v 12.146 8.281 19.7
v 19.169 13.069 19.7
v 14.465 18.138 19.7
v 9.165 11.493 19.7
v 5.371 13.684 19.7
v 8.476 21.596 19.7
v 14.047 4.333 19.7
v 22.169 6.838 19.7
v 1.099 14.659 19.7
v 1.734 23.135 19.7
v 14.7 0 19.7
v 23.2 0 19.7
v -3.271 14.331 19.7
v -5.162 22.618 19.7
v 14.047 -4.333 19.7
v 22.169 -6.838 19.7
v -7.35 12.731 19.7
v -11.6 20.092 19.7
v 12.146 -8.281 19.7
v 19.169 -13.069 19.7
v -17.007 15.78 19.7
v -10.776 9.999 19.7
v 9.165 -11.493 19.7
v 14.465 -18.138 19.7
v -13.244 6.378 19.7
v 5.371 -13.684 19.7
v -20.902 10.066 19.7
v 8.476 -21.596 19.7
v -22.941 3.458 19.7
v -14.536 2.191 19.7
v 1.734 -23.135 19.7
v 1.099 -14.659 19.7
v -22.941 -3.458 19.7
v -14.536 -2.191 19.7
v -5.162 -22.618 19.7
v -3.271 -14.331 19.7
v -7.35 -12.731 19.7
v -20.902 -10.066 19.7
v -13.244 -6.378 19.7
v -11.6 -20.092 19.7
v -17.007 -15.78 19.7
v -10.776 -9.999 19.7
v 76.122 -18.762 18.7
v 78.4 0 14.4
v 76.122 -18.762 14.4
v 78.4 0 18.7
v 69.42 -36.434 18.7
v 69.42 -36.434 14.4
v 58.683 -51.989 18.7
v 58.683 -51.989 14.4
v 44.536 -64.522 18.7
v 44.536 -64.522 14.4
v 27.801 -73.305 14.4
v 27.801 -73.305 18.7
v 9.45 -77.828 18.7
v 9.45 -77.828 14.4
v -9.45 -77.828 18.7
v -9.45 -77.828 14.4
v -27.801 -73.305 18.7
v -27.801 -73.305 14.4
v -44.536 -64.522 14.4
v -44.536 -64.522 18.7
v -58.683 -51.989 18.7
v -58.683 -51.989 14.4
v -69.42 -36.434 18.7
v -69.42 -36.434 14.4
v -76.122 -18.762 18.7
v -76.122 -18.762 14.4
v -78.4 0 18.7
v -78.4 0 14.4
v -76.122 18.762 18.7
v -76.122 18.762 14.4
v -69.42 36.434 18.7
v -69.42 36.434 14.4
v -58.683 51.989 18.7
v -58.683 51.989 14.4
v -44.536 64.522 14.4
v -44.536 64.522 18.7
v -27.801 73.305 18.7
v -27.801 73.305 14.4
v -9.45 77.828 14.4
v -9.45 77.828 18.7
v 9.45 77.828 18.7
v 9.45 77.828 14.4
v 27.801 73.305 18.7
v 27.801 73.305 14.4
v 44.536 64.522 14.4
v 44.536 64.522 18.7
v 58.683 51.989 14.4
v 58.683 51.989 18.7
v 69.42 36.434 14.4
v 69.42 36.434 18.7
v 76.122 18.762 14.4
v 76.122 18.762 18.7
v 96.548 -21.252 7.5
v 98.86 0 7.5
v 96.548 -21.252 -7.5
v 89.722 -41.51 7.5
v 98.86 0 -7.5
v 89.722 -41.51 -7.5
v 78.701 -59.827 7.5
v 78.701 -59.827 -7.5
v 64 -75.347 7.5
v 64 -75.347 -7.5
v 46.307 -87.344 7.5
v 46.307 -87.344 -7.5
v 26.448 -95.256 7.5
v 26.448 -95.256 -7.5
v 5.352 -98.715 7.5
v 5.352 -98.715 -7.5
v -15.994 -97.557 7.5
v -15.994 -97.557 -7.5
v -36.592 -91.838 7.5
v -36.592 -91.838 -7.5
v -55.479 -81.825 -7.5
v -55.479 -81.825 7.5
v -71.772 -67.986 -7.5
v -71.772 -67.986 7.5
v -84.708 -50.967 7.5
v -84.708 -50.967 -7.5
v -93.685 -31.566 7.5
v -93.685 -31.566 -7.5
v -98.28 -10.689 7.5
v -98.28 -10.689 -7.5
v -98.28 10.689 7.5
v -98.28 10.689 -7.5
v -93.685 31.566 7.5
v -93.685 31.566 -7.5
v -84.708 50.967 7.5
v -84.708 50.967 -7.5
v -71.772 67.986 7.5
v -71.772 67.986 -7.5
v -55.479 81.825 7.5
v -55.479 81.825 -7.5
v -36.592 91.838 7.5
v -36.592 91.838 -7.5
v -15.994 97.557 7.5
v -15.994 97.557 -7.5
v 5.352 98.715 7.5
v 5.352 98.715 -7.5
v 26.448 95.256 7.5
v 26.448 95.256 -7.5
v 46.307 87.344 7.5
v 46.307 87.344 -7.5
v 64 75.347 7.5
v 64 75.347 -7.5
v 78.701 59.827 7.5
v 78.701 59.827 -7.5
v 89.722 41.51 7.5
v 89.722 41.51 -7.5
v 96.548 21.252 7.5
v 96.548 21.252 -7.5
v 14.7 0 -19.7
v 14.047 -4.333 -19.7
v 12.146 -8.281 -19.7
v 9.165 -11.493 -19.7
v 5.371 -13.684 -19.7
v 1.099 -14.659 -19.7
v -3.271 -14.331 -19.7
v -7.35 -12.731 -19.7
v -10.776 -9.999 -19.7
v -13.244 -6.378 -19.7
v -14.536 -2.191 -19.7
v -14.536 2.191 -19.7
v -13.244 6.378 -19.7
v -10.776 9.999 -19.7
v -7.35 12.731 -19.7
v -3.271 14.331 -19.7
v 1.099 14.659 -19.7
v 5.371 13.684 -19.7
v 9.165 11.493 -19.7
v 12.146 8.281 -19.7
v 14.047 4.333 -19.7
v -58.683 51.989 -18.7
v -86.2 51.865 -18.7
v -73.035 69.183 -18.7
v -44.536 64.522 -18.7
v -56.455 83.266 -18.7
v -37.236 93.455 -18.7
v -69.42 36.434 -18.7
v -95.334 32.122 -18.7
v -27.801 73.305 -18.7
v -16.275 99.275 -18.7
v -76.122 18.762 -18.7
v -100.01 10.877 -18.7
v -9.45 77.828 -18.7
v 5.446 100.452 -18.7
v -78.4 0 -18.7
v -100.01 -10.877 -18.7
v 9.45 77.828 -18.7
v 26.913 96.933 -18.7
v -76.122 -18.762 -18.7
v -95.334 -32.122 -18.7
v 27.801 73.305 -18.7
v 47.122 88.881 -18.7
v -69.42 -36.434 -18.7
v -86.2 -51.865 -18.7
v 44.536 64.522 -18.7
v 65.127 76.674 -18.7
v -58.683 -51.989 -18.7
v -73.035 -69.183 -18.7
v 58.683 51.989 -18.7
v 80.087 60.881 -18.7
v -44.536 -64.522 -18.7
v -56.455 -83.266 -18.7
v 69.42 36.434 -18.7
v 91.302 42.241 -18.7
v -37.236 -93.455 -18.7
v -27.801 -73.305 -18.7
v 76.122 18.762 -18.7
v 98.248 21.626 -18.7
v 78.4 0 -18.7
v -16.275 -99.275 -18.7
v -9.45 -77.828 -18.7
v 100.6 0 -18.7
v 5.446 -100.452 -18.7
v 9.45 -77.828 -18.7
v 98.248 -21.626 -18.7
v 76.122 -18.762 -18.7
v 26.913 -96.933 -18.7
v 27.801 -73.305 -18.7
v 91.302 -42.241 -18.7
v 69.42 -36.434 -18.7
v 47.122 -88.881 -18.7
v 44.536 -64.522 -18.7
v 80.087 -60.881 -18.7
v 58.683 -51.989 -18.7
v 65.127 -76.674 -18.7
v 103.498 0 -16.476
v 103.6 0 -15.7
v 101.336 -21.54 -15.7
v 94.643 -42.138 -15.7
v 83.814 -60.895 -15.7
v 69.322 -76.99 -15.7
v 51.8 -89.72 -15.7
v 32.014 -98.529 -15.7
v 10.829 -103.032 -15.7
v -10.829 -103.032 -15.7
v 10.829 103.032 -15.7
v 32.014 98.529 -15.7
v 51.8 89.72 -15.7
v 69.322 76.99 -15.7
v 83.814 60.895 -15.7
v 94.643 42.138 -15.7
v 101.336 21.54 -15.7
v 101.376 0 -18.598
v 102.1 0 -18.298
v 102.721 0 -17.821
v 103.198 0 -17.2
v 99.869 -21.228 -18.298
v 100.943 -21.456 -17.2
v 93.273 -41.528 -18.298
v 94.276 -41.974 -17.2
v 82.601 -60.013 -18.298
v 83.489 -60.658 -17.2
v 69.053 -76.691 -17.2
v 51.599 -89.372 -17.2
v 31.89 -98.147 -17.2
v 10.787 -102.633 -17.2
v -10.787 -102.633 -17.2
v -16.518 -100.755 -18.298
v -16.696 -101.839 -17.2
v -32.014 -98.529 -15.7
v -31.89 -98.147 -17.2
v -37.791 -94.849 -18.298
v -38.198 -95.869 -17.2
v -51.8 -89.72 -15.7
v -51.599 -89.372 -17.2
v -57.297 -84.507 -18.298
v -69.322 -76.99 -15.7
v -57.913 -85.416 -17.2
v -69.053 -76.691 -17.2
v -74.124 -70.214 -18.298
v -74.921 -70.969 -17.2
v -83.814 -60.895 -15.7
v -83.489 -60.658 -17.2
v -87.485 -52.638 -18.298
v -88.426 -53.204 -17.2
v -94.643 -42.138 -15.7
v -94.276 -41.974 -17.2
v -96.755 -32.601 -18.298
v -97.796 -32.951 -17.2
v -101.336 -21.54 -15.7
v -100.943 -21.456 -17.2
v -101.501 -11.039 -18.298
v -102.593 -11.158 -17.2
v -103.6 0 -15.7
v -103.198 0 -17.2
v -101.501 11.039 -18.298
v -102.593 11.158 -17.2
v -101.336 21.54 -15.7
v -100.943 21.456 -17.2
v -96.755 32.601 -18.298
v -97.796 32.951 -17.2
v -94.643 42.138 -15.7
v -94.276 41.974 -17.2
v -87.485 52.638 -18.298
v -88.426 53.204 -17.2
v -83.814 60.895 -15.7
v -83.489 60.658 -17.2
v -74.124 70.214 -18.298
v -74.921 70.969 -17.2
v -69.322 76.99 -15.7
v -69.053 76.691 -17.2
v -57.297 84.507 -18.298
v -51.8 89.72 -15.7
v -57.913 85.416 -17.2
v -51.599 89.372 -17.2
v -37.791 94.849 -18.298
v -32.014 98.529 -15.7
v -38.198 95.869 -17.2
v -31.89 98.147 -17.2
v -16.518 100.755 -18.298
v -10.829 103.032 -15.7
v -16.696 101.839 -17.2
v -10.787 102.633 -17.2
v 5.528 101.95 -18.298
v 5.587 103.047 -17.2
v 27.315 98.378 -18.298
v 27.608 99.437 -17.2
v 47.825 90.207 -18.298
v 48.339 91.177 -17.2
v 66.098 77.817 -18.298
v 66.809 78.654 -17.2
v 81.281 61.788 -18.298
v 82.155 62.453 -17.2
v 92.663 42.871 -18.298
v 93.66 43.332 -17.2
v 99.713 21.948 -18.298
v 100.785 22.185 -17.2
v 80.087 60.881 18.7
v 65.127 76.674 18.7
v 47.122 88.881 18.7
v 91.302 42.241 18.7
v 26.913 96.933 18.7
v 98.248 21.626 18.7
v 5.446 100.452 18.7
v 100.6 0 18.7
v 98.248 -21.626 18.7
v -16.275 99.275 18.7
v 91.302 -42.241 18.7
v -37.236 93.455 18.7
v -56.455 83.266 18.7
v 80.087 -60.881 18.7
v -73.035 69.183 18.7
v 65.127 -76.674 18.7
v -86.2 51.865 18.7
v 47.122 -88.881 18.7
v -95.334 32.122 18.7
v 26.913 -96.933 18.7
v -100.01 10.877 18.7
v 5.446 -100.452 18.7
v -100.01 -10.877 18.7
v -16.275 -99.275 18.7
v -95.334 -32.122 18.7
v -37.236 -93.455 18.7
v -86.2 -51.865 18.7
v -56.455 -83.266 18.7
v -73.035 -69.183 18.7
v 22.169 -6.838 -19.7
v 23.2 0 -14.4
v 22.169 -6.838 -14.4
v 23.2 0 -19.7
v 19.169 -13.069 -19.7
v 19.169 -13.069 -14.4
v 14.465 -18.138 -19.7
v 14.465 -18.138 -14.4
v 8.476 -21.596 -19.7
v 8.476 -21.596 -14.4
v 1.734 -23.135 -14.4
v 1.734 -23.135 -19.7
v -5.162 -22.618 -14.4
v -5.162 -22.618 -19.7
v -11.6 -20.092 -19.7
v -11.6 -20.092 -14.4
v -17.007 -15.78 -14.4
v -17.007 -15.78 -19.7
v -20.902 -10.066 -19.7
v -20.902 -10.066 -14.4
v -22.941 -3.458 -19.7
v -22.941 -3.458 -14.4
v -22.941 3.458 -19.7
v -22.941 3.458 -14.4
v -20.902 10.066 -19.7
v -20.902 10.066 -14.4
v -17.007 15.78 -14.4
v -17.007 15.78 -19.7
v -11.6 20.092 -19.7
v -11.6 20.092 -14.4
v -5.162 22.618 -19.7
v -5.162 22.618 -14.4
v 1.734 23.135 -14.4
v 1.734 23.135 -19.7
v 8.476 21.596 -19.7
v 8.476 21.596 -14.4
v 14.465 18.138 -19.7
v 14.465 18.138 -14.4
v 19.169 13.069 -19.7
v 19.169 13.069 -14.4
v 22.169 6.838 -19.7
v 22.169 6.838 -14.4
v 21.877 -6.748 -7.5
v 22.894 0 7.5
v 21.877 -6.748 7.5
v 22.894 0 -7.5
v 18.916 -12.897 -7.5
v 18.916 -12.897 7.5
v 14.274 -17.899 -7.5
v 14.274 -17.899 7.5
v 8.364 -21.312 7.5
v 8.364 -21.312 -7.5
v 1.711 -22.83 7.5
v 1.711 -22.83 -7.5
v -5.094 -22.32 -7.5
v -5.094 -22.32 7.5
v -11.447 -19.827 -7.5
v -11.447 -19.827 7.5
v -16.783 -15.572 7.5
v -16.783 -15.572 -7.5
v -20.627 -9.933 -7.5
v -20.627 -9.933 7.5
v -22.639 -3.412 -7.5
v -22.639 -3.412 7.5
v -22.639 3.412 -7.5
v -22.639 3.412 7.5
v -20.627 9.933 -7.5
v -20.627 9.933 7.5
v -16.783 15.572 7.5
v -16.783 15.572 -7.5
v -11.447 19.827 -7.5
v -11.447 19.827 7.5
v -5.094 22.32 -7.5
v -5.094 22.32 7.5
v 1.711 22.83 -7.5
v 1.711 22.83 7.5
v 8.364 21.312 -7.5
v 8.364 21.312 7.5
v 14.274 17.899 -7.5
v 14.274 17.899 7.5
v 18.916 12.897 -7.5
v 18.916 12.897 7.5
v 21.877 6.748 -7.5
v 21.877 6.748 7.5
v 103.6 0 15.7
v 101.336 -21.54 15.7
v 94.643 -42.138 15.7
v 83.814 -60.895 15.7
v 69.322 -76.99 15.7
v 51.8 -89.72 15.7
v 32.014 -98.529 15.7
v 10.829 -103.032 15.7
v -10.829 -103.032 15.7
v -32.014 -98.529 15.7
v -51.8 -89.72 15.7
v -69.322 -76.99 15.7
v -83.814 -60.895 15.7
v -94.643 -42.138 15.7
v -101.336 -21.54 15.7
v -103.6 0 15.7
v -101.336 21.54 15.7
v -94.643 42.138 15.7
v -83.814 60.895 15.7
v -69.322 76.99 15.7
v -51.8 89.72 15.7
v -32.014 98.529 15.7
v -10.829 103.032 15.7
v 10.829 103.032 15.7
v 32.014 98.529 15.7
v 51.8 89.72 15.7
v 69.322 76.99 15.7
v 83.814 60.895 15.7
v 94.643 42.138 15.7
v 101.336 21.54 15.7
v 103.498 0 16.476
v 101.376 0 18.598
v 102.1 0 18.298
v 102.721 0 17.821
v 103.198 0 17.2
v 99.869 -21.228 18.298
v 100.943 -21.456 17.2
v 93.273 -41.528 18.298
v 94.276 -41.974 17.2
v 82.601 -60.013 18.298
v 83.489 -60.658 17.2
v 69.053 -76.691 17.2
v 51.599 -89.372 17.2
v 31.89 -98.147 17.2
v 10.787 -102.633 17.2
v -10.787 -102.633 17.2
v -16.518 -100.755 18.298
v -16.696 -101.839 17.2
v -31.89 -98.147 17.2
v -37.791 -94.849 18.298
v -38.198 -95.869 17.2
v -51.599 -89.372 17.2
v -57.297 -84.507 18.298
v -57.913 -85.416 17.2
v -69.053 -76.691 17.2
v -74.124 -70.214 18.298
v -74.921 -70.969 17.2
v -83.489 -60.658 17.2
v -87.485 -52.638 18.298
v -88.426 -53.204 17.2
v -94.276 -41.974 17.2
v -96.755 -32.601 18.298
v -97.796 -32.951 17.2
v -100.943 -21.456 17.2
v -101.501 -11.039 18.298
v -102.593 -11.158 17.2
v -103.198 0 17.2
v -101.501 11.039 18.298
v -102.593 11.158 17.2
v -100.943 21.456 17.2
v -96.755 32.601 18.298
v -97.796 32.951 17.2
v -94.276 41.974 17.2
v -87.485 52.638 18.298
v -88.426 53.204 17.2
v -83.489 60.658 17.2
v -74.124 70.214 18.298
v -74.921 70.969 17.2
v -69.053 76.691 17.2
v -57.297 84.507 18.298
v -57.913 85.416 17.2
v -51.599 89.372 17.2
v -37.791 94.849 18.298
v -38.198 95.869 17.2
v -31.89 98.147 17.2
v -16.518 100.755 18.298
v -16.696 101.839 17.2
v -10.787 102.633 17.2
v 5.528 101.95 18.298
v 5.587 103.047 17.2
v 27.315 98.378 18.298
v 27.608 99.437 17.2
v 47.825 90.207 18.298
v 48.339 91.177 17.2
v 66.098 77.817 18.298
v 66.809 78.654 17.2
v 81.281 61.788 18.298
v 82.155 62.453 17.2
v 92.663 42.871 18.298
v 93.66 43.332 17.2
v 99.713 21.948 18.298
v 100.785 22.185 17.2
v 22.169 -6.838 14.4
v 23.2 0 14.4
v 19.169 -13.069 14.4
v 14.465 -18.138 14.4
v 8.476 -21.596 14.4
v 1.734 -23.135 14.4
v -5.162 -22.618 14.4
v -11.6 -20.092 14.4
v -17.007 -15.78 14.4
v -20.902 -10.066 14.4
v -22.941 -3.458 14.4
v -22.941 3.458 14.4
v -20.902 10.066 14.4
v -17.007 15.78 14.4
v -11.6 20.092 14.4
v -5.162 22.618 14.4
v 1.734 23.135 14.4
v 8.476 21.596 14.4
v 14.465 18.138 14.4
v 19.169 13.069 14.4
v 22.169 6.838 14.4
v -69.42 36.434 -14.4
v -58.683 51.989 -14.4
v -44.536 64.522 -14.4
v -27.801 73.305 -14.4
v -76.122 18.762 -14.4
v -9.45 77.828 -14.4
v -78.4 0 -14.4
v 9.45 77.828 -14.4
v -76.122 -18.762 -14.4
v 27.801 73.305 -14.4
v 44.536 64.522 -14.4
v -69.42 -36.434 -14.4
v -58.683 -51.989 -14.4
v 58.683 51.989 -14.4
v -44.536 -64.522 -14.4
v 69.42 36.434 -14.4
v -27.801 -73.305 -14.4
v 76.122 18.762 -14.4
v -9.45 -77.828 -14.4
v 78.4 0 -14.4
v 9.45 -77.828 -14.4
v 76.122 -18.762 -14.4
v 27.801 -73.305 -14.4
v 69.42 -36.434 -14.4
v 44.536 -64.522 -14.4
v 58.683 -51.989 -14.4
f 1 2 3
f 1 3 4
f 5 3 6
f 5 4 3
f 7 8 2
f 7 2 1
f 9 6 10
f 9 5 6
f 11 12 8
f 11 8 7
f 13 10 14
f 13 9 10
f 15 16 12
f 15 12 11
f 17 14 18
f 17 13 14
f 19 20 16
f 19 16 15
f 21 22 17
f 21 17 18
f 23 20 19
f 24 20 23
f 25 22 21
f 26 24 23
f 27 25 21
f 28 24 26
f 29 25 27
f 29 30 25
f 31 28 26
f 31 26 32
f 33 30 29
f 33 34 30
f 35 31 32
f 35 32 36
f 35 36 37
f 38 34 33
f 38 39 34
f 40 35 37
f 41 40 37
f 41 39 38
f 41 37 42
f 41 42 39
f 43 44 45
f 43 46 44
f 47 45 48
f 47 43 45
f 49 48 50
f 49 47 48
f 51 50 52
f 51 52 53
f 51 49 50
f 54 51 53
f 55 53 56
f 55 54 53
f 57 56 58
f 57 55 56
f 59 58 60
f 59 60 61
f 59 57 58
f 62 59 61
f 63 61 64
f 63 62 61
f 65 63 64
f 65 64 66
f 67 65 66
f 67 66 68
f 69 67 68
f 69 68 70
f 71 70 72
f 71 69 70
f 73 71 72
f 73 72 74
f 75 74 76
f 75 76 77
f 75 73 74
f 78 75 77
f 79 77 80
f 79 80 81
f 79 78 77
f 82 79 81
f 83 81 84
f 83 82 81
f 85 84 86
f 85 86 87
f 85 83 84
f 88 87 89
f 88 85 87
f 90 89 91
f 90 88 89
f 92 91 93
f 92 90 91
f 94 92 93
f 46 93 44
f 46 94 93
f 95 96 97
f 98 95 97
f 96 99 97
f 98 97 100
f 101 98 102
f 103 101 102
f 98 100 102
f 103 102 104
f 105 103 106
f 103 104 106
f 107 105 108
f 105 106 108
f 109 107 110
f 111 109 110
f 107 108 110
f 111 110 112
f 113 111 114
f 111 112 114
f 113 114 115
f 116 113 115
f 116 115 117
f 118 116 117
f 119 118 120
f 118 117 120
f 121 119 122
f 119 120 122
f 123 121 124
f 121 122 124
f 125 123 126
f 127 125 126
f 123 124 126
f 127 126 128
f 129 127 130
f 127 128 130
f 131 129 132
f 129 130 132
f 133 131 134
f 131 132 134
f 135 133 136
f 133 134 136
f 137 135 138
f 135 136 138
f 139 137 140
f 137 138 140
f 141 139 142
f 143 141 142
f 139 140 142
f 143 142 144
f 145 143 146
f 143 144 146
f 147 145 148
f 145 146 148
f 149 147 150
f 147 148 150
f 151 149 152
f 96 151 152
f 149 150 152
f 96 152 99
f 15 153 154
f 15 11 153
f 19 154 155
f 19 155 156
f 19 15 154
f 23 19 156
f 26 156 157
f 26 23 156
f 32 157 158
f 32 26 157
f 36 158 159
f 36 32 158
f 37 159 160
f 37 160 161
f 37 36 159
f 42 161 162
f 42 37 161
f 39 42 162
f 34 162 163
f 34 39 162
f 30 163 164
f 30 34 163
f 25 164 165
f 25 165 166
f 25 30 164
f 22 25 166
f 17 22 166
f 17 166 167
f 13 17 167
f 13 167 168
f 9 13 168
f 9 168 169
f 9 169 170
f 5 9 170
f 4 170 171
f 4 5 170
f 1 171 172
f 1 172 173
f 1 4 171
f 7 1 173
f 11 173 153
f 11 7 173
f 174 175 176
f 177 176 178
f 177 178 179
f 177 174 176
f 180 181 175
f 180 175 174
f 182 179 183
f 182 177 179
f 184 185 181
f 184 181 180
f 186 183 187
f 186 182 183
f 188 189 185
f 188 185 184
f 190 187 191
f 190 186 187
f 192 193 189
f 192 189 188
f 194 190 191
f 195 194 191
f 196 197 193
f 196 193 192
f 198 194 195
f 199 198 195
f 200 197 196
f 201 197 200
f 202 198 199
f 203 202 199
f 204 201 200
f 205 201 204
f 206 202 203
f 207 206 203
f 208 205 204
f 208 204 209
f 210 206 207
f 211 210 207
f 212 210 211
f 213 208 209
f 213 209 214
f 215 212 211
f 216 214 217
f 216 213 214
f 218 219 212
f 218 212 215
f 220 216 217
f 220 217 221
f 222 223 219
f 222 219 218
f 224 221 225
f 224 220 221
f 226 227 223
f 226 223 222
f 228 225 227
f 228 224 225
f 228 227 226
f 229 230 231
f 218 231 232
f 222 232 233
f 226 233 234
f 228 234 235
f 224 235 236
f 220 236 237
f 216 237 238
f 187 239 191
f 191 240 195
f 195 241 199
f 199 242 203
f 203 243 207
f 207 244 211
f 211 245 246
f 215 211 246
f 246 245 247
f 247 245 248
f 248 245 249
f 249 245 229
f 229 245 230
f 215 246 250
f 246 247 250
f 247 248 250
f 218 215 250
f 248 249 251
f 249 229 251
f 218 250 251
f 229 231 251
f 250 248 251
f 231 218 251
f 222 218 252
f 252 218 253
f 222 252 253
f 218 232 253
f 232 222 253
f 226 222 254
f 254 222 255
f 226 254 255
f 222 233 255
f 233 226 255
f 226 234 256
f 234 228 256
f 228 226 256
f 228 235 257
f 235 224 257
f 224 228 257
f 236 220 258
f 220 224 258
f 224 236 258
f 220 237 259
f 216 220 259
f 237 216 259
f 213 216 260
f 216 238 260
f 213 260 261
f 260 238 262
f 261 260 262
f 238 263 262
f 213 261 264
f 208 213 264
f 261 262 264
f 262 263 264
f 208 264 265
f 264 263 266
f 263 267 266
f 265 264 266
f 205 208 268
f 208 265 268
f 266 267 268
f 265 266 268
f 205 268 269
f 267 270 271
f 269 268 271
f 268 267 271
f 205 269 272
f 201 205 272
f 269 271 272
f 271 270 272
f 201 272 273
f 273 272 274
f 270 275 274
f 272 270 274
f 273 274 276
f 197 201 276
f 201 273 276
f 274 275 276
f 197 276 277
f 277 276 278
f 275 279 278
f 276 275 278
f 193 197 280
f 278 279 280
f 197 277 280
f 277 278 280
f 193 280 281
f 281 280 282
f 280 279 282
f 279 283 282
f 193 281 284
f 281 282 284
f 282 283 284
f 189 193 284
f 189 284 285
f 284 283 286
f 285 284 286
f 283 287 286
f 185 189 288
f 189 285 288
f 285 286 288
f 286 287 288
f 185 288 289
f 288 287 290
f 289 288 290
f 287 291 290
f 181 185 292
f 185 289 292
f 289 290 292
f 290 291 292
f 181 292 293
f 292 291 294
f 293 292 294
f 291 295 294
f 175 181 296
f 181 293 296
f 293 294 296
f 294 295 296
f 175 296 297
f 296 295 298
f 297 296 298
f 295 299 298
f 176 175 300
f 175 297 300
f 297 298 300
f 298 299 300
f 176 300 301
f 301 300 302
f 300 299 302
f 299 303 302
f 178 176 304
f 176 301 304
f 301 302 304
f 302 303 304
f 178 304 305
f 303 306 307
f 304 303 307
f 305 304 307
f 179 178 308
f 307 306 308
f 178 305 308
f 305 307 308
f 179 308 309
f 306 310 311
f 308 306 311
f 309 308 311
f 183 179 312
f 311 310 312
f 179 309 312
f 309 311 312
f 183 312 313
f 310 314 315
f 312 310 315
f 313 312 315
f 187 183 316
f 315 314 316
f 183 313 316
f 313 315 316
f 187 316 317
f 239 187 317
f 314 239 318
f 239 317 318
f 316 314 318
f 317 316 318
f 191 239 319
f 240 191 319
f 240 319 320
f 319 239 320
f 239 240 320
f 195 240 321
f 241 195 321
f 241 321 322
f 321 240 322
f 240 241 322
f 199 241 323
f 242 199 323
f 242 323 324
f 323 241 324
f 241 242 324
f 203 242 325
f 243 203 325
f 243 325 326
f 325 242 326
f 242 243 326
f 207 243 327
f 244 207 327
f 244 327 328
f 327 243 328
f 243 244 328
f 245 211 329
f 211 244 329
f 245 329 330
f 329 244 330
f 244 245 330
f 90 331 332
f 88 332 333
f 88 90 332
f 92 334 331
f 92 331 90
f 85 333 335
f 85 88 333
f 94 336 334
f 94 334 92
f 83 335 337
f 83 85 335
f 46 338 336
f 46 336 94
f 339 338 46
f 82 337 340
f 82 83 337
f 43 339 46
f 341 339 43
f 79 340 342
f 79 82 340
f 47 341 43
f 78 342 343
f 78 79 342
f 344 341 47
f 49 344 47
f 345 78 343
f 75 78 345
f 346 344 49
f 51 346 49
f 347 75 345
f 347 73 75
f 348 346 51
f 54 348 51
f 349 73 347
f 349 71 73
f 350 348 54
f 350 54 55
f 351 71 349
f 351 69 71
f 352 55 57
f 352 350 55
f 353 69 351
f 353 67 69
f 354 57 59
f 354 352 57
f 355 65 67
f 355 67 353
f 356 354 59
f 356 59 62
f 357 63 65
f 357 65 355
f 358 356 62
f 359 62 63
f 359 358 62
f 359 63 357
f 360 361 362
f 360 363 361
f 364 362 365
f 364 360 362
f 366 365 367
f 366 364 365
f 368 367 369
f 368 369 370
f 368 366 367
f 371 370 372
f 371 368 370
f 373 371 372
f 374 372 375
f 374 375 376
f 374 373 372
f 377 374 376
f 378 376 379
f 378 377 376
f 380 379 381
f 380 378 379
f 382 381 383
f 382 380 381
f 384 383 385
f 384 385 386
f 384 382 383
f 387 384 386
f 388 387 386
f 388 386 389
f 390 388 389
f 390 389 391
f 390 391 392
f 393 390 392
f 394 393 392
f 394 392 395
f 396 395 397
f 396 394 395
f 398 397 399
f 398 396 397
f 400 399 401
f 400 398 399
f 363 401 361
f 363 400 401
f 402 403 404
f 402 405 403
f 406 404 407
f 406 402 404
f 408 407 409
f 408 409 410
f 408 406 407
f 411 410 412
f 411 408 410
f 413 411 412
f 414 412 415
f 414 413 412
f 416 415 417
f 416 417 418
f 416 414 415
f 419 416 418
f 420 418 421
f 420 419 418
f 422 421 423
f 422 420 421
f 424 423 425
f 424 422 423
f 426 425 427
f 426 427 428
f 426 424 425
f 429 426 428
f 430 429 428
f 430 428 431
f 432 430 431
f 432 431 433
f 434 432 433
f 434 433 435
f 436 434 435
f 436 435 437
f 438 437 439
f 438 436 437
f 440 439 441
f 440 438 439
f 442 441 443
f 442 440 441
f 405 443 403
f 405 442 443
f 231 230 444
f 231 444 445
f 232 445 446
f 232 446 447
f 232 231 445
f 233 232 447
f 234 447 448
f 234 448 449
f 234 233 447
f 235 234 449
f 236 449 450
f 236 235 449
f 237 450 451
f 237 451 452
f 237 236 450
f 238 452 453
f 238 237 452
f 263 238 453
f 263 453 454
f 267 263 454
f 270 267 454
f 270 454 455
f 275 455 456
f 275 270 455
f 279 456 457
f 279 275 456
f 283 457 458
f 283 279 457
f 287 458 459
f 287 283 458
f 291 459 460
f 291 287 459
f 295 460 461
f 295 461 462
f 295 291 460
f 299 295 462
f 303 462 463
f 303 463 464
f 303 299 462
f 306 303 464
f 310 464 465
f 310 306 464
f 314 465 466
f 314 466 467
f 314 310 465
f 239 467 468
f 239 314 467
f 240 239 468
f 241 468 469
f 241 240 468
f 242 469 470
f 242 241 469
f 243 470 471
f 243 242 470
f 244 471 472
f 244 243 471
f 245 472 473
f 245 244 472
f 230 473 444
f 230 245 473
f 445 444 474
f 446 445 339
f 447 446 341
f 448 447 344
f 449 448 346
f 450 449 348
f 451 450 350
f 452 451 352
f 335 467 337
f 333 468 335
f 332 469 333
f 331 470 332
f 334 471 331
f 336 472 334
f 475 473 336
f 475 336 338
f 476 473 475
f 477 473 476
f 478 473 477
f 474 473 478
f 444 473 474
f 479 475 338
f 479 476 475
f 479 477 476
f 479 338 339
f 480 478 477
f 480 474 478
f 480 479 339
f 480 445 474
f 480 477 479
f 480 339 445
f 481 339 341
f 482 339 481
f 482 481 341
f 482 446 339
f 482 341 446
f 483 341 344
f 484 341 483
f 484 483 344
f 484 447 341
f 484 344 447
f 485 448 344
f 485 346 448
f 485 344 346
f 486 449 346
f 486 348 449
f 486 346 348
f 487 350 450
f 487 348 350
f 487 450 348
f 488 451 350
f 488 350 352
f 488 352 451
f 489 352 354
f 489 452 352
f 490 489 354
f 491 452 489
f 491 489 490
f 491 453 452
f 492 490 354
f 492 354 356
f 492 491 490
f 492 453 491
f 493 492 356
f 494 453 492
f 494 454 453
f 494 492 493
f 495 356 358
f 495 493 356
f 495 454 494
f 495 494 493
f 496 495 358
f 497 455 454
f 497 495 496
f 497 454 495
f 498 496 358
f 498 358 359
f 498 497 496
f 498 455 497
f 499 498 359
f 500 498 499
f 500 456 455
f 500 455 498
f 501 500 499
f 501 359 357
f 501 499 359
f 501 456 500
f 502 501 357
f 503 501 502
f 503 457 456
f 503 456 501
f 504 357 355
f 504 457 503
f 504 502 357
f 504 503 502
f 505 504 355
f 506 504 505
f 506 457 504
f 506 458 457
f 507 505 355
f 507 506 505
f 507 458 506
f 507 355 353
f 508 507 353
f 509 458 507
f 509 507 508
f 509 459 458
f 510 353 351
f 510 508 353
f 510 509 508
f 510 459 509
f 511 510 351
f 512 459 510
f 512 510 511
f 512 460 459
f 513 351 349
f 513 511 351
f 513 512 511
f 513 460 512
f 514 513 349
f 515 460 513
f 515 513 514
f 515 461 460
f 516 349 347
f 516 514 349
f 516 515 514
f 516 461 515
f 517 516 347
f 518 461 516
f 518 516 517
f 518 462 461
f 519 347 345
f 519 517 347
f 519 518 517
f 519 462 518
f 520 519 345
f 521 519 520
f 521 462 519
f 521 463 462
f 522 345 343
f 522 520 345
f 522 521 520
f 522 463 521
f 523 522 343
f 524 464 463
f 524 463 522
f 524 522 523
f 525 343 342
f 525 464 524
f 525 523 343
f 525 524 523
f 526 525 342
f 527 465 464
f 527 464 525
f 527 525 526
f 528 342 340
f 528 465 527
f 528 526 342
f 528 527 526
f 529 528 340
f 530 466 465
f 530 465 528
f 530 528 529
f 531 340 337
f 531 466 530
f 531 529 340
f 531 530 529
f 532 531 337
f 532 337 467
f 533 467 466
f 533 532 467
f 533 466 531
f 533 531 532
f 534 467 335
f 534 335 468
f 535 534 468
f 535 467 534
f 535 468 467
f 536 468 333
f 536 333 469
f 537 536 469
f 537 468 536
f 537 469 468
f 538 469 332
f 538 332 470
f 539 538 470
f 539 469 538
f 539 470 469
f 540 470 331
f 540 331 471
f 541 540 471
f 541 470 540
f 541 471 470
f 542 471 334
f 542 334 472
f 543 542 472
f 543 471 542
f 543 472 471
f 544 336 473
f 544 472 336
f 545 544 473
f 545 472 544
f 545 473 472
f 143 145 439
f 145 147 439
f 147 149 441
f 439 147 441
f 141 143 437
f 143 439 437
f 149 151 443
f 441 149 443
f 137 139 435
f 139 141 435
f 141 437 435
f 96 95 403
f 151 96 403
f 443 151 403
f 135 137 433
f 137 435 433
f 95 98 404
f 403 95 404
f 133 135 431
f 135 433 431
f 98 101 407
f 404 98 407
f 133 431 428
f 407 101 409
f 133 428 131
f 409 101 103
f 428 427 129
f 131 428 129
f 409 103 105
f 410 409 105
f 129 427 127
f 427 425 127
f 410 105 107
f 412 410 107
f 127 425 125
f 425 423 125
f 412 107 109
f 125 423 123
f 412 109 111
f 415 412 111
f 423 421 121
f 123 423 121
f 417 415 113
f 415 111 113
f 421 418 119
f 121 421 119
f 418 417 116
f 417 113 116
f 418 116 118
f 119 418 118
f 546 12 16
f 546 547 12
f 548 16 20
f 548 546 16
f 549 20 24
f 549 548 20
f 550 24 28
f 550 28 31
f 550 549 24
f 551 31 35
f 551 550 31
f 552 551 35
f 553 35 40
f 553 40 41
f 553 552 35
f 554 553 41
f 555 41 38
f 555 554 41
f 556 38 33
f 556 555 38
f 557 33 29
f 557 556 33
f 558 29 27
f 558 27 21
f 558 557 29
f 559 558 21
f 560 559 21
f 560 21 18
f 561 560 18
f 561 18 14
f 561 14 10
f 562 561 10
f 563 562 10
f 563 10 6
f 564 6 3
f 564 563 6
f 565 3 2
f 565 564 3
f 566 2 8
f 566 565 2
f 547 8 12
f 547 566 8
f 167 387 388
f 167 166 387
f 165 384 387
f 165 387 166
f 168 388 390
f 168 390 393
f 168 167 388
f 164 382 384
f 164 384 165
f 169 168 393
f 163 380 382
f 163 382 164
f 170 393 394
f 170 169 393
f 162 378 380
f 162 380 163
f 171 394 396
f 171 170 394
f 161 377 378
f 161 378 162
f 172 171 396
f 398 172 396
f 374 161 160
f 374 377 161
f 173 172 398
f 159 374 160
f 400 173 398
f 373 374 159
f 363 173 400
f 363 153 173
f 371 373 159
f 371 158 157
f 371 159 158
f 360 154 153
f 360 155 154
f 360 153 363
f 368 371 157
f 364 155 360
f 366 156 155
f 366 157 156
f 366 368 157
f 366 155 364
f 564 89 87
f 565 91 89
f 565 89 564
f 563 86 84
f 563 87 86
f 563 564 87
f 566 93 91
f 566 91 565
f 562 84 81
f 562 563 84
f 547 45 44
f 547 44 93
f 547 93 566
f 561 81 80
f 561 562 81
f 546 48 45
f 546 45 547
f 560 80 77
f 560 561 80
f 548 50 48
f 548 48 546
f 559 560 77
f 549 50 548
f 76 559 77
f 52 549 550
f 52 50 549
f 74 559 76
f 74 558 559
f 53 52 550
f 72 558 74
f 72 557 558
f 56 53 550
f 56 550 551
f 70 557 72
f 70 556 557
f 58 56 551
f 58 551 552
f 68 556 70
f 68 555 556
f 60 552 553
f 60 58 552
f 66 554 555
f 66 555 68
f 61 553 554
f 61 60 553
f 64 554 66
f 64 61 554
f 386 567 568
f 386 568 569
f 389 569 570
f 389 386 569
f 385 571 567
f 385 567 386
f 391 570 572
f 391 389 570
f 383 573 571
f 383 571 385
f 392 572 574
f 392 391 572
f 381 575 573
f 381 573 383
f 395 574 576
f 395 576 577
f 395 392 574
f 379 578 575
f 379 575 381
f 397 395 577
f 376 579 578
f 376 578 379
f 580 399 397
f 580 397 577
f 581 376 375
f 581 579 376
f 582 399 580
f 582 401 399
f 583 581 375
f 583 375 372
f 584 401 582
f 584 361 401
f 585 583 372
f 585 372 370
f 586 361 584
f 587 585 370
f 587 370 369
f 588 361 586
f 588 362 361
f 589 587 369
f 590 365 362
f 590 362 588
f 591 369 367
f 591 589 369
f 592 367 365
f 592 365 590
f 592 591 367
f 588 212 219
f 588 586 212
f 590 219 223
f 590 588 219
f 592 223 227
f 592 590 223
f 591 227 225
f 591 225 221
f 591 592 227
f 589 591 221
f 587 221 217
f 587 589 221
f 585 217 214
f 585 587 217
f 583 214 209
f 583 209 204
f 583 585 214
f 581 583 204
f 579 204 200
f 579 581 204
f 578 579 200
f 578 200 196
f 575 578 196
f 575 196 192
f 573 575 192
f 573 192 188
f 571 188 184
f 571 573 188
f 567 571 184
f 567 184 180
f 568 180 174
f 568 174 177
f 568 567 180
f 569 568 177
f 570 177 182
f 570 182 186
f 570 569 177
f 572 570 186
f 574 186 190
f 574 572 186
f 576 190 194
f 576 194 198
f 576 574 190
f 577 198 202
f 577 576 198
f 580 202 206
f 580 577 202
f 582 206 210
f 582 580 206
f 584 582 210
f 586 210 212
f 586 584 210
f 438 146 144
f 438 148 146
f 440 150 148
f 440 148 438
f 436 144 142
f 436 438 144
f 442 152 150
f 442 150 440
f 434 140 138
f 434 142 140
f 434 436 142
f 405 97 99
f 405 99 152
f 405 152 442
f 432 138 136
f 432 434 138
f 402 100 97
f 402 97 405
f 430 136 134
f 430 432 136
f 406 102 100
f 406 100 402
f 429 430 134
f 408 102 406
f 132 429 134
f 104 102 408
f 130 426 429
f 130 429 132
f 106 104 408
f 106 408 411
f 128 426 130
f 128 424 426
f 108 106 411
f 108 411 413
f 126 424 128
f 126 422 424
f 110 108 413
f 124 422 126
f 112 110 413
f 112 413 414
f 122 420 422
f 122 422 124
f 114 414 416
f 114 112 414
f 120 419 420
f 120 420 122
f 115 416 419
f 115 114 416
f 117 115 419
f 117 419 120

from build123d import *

# Parameters (mm, degrees)
SKETCH1_W = 15
SKETCH1_H = 75.965253598
FILLET1_R = 3


with BuildPart() as part:
    # Sketch1 → Revolve1 (revolve)
    with BuildSketch(Plane(origin=(0, 0, 0), x_dir=(0, 0, -1), z_dir=(1, 0, 0)), mode=Mode.PRIVATE) as revolve1_sk:
        Polygon((19.7, 14.7), (-19.7, 14.7), (-19.7, 23.2), (-14.4, 23.2), (-14.4, 78.4), (-18.7, 78.4), (-18.7, 103.6), (18.7, 103.6), (18.7, 78.4), (14.4, 78.4), (14.4, 23.2), (19.7, 23.2), align=None)
        with Locations((0, 60.876891385)):
            Rectangle(SKETCH1_W, SKETCH1_H, mode=Mode.SUBTRACT)
    revolve(revolve1_sk.sketch.rotate(Axis((0, 0, 15.387931034), (0, 0, -1)), 90), axis=Axis((0, 0, 15.387931034), (0, 0, -1)))

    # Fillet1
    fillet1_edges = [part.edges().sort_by_distance(p)[0] for p in [
        (-103.6, 0, -18.7),
        (-103.6, 0, 18.7),
    ]]
    fillet(fillet1_edges, radius=FILLET1_R)


solid = part.part
